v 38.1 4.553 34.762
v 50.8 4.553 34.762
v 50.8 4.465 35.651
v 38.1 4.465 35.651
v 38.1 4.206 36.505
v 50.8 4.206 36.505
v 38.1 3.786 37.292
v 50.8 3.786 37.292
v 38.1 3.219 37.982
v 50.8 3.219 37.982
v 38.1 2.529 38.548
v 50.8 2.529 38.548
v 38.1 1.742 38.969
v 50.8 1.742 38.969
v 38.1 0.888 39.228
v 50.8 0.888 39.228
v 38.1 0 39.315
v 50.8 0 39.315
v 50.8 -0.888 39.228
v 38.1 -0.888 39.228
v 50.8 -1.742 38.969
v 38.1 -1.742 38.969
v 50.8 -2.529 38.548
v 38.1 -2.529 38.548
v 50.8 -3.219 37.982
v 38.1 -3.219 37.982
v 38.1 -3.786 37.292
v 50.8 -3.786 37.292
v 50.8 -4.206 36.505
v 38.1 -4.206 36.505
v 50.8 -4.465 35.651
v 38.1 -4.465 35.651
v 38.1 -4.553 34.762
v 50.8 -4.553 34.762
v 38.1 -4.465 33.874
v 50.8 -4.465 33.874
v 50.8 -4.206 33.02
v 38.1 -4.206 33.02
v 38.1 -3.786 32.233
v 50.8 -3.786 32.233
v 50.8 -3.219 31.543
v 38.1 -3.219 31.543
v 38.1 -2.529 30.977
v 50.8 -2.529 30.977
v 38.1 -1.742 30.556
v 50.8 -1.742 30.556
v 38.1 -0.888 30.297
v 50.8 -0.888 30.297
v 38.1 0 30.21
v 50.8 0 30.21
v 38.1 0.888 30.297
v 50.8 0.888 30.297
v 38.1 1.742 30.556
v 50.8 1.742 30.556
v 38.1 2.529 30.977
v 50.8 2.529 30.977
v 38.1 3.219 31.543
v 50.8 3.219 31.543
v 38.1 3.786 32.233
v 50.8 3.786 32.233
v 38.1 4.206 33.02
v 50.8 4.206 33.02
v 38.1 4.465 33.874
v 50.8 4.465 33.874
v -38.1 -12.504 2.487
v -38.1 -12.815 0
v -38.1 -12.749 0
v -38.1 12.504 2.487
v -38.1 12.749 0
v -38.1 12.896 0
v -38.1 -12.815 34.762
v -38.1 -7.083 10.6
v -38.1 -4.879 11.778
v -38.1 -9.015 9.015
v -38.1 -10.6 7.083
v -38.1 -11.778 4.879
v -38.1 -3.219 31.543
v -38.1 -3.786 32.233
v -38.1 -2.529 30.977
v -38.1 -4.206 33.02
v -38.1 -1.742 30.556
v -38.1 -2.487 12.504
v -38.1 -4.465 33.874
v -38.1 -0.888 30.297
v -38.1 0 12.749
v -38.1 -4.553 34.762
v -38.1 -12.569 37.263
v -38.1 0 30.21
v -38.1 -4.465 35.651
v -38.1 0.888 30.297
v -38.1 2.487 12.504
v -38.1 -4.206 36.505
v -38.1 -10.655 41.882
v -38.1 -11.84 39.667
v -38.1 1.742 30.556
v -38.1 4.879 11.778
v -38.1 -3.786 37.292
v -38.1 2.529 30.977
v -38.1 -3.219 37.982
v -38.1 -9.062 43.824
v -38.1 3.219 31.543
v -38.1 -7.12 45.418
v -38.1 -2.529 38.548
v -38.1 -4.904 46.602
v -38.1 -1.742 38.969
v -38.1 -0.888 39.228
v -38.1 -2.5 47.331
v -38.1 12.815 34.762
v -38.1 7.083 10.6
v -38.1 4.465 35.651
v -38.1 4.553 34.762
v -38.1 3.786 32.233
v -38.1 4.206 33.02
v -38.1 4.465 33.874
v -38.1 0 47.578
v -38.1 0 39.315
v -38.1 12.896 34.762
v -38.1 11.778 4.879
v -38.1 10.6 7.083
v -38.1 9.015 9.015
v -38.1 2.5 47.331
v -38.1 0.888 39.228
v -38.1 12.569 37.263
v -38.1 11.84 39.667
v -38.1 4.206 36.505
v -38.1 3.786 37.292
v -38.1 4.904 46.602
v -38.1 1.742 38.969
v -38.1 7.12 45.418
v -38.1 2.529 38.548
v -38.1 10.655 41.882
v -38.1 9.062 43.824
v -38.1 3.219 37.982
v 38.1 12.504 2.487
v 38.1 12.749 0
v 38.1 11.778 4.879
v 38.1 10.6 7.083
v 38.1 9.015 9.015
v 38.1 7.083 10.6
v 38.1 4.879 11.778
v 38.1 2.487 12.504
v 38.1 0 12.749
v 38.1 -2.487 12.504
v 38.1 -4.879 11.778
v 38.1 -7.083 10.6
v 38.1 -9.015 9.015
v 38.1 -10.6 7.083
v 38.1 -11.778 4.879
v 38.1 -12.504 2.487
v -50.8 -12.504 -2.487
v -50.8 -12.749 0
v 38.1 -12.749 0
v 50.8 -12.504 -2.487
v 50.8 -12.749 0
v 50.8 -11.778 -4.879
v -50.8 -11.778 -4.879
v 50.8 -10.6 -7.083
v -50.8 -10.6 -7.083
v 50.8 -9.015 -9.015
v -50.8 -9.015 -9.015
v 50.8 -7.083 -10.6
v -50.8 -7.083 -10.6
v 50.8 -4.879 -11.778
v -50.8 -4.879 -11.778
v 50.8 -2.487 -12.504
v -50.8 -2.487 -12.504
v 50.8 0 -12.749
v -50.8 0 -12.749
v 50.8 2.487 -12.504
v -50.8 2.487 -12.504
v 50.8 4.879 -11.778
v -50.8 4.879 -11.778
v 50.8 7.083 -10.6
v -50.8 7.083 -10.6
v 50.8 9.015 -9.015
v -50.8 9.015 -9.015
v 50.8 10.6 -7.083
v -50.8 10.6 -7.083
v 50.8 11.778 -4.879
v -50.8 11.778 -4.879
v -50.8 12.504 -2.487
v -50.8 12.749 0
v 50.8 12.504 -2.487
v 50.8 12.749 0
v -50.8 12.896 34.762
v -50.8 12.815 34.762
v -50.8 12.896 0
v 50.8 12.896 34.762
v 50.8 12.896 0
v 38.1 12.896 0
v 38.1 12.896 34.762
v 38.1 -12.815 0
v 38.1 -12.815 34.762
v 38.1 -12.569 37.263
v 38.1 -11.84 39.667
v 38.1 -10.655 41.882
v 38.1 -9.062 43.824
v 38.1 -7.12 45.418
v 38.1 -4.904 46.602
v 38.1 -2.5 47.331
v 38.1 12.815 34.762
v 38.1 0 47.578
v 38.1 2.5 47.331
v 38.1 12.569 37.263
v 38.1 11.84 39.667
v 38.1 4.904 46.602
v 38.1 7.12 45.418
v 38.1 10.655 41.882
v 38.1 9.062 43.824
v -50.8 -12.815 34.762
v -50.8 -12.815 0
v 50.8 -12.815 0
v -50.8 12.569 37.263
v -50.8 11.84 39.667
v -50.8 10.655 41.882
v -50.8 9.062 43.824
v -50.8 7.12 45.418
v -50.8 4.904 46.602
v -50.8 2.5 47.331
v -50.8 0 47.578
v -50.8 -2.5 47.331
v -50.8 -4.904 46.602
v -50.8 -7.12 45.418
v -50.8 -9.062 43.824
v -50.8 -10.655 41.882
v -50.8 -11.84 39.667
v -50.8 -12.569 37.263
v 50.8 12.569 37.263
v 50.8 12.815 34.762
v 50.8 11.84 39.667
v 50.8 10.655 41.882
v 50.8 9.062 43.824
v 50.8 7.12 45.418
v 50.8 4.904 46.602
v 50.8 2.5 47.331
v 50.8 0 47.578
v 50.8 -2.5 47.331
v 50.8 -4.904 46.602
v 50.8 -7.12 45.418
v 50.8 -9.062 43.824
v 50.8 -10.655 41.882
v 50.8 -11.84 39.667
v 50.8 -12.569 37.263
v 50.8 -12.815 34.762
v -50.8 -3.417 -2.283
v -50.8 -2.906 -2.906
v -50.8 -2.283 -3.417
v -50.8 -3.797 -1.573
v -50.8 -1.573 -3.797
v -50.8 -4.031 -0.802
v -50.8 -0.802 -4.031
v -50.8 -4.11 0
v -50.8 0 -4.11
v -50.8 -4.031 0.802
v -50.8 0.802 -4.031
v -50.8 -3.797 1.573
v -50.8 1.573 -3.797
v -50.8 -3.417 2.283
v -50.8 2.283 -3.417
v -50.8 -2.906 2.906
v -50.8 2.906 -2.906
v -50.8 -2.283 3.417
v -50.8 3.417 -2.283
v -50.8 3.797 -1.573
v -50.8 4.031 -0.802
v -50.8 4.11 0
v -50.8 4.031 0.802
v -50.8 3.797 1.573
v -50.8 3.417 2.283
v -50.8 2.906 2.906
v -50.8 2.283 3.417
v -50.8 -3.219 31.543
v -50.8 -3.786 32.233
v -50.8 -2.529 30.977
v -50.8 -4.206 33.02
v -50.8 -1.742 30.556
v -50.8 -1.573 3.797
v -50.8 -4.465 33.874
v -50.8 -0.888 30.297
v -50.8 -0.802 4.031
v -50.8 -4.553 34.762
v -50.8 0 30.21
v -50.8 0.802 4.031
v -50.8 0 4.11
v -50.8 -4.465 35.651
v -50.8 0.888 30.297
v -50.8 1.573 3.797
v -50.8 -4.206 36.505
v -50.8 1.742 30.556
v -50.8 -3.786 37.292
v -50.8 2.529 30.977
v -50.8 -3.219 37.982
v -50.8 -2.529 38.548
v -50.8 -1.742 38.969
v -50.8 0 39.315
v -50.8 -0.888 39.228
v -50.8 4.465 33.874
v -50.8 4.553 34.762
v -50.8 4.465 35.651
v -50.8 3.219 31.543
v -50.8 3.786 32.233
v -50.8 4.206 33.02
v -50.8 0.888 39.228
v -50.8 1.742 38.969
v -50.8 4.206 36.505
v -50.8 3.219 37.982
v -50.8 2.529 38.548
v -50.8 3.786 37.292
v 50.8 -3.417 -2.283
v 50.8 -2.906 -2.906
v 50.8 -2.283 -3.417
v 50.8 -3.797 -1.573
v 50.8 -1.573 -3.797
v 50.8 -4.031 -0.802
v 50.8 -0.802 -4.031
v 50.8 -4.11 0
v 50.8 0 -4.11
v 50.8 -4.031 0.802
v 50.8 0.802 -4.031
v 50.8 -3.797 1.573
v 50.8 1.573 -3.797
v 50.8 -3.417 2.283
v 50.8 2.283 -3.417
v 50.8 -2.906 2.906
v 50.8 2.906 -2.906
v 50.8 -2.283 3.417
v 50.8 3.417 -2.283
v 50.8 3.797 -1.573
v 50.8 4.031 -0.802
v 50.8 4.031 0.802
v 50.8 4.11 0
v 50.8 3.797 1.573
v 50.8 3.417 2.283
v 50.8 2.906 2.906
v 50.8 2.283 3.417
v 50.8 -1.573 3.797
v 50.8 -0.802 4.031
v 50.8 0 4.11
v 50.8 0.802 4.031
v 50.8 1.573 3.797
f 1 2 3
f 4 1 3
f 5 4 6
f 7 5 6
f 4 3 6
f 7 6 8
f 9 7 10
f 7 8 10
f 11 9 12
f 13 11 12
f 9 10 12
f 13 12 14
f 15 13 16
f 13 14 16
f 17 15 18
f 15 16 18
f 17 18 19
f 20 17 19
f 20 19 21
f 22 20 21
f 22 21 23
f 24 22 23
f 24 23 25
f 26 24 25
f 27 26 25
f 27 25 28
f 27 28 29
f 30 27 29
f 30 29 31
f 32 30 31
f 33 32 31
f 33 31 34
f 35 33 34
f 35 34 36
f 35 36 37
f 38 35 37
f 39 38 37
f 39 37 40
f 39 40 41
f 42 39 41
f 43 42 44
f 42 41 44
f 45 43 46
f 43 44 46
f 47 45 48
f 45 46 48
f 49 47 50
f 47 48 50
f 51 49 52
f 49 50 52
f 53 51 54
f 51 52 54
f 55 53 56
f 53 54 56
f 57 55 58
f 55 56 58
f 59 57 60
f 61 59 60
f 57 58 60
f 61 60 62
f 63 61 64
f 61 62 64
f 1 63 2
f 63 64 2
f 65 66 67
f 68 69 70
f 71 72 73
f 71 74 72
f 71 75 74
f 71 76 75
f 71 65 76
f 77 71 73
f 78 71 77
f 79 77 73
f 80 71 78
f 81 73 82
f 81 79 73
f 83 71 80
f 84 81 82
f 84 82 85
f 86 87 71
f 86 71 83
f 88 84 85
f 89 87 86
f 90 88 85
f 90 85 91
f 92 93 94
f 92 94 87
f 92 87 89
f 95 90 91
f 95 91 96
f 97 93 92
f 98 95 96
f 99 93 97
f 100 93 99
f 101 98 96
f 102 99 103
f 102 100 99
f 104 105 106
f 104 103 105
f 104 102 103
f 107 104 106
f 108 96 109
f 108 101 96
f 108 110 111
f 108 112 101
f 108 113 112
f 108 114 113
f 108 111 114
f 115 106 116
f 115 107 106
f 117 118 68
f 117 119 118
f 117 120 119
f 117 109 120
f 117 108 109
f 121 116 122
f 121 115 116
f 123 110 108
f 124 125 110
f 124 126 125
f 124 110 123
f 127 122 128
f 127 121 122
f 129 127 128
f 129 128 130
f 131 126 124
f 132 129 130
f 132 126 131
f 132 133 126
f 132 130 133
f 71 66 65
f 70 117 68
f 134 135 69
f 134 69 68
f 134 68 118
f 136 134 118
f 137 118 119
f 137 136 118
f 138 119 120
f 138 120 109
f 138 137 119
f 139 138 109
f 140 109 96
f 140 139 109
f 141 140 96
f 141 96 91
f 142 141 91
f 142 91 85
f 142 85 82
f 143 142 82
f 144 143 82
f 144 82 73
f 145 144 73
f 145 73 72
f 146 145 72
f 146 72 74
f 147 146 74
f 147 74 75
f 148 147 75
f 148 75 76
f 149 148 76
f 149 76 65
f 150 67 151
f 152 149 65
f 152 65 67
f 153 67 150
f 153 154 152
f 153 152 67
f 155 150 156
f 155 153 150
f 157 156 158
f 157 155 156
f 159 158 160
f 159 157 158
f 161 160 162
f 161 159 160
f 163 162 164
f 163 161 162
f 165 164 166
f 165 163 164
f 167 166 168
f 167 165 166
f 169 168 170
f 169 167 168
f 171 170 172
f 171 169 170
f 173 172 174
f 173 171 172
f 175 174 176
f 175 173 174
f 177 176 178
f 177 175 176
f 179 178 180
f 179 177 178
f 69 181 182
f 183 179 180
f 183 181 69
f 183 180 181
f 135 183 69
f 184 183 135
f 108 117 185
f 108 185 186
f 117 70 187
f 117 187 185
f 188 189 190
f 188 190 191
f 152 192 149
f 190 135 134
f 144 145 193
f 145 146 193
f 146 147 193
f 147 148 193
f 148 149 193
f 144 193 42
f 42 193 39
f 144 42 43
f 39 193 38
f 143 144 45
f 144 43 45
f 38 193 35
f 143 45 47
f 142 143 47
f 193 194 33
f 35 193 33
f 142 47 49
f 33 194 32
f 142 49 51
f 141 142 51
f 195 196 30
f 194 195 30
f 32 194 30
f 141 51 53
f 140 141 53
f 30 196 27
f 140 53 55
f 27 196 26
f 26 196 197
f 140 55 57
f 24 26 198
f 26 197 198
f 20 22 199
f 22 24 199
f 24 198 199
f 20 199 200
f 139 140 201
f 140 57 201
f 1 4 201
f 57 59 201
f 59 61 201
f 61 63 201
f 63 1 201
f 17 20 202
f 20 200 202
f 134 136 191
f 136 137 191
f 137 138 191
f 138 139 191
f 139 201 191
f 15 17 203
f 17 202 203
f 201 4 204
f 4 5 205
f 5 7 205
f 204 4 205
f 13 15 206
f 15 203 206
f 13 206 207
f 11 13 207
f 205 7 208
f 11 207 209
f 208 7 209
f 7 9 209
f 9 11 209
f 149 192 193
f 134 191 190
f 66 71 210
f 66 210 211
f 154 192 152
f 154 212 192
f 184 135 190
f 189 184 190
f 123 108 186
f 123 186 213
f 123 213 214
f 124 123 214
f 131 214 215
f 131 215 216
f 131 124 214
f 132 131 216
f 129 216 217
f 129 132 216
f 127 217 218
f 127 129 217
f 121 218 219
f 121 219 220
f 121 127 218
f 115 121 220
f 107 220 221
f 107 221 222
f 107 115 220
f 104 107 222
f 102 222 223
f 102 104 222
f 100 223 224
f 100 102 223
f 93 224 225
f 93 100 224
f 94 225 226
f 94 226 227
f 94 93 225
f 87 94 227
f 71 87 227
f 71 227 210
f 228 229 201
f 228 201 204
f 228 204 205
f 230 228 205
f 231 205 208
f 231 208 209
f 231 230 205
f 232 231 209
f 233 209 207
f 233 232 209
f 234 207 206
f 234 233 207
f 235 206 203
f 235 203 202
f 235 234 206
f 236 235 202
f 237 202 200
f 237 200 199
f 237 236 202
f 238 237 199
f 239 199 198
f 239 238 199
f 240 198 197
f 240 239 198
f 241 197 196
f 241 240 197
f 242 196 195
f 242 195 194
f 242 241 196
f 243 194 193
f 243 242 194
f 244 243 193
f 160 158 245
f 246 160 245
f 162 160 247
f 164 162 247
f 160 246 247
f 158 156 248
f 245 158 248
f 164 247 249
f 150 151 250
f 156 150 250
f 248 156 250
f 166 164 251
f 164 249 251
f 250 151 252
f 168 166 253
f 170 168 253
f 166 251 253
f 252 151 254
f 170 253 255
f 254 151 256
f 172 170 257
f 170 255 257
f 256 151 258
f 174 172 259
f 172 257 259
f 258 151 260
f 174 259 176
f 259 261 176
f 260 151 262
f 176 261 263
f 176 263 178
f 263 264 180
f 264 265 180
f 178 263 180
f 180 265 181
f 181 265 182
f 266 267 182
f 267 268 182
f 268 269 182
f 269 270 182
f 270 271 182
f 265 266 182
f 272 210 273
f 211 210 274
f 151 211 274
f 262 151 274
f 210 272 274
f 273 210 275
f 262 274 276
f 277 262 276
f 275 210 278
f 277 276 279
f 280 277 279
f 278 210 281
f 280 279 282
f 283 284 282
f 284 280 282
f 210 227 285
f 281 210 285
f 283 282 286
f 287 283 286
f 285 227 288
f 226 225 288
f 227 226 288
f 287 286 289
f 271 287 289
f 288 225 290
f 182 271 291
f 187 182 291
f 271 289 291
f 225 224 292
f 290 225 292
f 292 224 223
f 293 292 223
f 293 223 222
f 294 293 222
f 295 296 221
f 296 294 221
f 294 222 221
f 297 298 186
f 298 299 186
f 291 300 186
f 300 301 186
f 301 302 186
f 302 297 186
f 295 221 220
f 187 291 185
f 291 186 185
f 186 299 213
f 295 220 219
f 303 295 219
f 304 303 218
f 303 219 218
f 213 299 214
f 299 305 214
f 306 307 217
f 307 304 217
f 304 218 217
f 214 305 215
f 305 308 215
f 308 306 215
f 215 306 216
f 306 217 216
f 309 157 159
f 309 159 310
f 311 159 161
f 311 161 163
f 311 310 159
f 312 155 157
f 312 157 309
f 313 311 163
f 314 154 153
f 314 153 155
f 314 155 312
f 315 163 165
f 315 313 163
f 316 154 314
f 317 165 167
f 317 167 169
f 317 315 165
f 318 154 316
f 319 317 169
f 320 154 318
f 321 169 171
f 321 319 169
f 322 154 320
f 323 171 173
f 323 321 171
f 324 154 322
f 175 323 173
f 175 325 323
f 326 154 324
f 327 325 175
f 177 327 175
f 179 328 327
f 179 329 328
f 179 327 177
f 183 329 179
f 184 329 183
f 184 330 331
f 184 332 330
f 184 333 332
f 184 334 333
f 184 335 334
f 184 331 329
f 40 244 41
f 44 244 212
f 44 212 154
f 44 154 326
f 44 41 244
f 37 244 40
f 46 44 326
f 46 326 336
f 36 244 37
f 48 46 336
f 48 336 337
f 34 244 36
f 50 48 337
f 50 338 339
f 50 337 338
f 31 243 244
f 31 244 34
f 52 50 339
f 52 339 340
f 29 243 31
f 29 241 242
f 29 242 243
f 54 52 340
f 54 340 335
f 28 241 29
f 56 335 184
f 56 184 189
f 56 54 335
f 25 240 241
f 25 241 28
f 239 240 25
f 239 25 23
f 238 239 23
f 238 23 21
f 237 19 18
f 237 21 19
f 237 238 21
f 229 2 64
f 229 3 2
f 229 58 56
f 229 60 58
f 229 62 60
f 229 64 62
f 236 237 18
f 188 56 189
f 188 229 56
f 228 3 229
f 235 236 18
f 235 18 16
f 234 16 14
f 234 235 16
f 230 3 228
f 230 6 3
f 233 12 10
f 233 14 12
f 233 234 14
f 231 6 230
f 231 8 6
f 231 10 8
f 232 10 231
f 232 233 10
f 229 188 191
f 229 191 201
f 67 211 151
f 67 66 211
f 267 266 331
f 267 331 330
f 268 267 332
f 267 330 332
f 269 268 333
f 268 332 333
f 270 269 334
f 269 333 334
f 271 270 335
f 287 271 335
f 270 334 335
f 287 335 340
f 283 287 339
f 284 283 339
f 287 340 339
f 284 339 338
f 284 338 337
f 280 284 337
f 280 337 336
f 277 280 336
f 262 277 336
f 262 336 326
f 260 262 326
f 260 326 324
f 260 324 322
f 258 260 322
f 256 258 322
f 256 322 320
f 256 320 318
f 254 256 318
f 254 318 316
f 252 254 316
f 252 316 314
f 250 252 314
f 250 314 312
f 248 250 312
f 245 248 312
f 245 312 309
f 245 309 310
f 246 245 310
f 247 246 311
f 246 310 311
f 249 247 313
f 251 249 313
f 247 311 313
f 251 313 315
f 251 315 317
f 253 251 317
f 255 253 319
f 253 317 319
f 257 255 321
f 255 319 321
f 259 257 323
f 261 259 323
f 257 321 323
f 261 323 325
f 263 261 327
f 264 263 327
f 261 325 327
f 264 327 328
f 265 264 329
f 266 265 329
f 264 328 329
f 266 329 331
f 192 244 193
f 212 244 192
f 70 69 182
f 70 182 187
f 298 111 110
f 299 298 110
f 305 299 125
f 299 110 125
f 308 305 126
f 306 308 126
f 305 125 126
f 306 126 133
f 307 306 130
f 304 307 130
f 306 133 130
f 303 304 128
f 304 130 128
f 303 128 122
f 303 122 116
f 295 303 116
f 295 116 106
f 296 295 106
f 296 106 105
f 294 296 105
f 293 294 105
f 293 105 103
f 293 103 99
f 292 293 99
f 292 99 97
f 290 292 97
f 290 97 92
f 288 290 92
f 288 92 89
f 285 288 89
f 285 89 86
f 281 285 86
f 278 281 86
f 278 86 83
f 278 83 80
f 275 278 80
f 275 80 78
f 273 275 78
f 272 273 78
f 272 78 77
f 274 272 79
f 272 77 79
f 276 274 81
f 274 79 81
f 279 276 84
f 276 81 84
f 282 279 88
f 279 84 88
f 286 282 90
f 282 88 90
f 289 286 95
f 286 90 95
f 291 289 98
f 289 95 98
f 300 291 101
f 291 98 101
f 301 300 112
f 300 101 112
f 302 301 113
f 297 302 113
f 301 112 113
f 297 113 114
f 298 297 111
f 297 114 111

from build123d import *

# Parameters (mm, degrees)
F0_R     = 12.7485465516
F2_DEPTH = 50.8
F4_DEPTH = 50.8
F6_DEPTH = 38.1
F7_DEPTH = 50.8
F8_R     = 4.5528503381
F8_R_2   = 4.1100274938
F9_DEPTH = 101.601


with BuildPart() as f2:
    # F0 (on Right) → F2 (new body)
    with BuildSketch(Plane.YZ):
        Circle(F0_R)
    extrude(amount=F2_DEPTH)

    # F3: F2 across plane


with BuildPart() as f2_1:
    add(f2.part)
    add(f2.part.mirror(Plane.YZ))

    # F1 (on Right) → F4 (join)
    with BuildSketch(Plane.YZ):
        with BuildLine():
            Line((-12.815132901, 34.7624458373), (12.815132901, 34.7624458373))
            ThreePointArc((12.815132901, 34.7624458373), (0, 47.5775787383), (-12.815132901, 34.7624458373))
        make_face()
        with BuildLine():
            Line((12.8961233422, 34.7624458373), (12.815132901, 34.7624458373))
            ThreePointArc((12.815132901, 34.7624458373), (0, 21.9473129363), (-12.815132901, 34.7624458373))
            Line((-12.815132901, 34.7624458373), (-12.815132901, 0))
            Line((-12.815132901, 0), (12.8961233422, 0))
            Line((12.8961233422, 0), (12.8961233422, 34.7624458373))
        make_face()
        with BuildLine():
            ThreePointArc((-12.815132901, 34.7624458373), (0, 21.9473129363), (12.815132901, 34.7624458373))
            Line((12.815132901, 34.7624458373), (-12.815132901, 34.7624458373))
        make_face()
    extrude(amount=F4_DEPTH)

    # F5: F2 across plane


with BuildPart() as f2_2:
    add(f2_1.part)
    add(f2_1.part.mirror(Plane.YZ))

    # F1 (on Right) → F6 (cut, symmetric)
    with BuildSketch(Plane.YZ):
        with BuildLine():
            Line((-12.815132901, 34.7624458373), (12.815132901, 34.7624458373))
            ThreePointArc((12.815132901, 34.7624458373), (0, 47.5775787383), (-12.815132901, 34.7624458373))
        make_face()
        with BuildLine():
            Line((12.8961233422, 34.7624458373), (12.815132901, 34.7624458373))
            ThreePointArc((12.815132901, 34.7624458373), (0, 21.9473129363), (-12.815132901, 34.7624458373))
            Line((-12.815132901, 34.7624458373), (-12.815132901, 0))
            Line((-12.815132901, 0), (12.8961233422, 0))
            Line((12.8961233422, 0), (12.8961233422, 34.7624458373))
        make_face()
        with BuildLine():
            ThreePointArc((-12.815132901, 34.7624458373), (0, 21.9473129363), (12.815132901, 34.7624458373))
            Line((12.815132901, 34.7624458373), (-12.815132901, 34.7624458373))
        make_face()
    extrude(amount=F6_DEPTH, both=True, mode=Mode.SUBTRACT)

    # F0 (on Right) → F7 (join, symmetric)
    with BuildSketch(Plane.YZ):
        Circle(F0_R)
    extrude(amount=F7_DEPTH, both=True)

    # F8 (on face) → F9 (cut, through all)
    with BuildSketch(Plane.YZ.offset(50.8)):
        with Locations((0, 34.7624458373)):
            Circle(F8_R)
        Circle(F8_R_2)
    extrude(amount=-F9_DEPTH, mode=Mode.SUBTRACT)


solid = f2_2.part
